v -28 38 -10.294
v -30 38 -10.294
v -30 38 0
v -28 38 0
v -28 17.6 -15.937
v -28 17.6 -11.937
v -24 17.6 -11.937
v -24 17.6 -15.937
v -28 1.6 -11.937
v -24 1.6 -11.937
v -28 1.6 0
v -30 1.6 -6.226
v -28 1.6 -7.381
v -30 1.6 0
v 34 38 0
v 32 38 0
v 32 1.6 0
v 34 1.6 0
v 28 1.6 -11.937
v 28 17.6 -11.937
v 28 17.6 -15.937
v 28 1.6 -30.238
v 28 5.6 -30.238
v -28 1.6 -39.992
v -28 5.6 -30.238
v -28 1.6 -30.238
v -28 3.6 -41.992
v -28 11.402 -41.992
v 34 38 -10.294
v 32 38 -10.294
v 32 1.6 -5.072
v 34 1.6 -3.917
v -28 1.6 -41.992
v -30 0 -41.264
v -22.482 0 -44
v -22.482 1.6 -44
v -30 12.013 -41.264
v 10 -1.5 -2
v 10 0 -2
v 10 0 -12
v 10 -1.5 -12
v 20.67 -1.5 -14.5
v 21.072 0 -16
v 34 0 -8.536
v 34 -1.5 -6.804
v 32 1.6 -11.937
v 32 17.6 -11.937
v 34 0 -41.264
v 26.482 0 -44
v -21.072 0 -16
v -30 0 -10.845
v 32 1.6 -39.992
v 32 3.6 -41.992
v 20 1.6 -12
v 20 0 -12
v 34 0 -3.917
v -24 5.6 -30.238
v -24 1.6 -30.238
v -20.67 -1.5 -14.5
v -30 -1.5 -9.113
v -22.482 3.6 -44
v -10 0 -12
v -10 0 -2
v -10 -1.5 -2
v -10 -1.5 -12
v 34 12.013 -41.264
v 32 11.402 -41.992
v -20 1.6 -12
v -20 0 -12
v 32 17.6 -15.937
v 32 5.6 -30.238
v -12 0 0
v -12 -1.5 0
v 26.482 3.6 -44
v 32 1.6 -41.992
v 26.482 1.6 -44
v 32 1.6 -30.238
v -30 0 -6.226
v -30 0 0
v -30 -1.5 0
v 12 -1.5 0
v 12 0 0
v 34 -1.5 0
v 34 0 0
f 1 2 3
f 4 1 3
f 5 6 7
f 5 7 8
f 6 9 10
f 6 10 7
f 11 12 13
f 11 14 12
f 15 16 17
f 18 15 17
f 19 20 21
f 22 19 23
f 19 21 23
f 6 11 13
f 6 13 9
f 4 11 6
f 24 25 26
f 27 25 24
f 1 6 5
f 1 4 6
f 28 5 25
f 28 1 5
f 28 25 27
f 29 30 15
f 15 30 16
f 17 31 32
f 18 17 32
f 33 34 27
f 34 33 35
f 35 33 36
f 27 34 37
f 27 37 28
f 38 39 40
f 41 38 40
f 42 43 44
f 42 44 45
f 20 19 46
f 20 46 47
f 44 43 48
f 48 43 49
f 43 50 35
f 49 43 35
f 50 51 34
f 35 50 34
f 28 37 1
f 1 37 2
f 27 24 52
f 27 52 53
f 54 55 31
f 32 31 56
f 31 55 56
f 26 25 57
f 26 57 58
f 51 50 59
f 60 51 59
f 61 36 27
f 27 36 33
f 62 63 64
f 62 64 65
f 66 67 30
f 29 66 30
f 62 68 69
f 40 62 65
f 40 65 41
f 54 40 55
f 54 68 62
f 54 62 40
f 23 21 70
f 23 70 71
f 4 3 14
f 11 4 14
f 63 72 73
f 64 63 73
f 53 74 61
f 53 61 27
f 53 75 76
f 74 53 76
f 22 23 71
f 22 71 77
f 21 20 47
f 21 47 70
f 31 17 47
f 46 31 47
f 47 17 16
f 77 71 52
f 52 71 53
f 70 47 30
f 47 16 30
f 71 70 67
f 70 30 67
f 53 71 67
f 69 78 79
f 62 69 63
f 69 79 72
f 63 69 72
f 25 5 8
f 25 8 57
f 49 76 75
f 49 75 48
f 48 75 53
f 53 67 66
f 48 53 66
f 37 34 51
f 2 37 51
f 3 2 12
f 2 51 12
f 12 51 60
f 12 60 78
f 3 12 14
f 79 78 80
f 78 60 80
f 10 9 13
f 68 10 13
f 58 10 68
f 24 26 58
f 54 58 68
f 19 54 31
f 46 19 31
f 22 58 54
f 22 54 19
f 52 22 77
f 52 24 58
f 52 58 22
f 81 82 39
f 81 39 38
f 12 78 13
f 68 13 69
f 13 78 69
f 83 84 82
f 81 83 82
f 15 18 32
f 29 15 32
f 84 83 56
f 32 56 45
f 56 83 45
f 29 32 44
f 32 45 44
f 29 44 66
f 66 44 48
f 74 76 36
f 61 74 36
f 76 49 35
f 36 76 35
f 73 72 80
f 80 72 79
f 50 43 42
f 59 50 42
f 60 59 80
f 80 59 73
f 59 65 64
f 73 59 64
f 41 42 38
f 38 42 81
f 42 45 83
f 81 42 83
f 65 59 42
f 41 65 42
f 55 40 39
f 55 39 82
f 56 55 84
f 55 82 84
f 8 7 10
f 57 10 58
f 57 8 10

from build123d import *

# Parameters (mm, degrees)
BOSS_EXTRUDE1_DEPTH      = 34
BOSS_EXTRUDE1_DEPTH_BACK = 30
SKETCH2_W                = 60
SKETCH2_H                = 44
CUT_EXTRUDE1_DEPTH       = 36.4
CUT_EXTRUDE2_DEPTH       = 1.6
BOSS_EXTRUDE2_DEPTH      = 1.5
CHAMFER1_SIZE            = 2
CUT_EXTRUDE3_REACH       = 70.207
SKETCH8_W                = 20
SKETCH8_H                = 12
CUT_EXTRUDE4_DEPTH       = 1.5
BOSS_EXTRUDE3_REACH      = 86.994
CUT_EXTRUDE7_REACH       = 61.23
SKETCH12_W               = 52
SKETCH12_H               = 18.301043111
CHAMFER2_SIZE            = 2
BOSS_EXTRUDE4_DEPTH      = 60
BOSS_EXTRUDE5_DEPTH      = 2


with BuildPart() as part:
    # Sketch1 → Boss-Extrude1 (new, two sides: drawn at the far end of the back side and taken through both)
    with BuildSketch(Plane(origin=(0, 0, 0), x_dir=(0, 0, -1), z_dir=(1, 0, 0)).offset(-BOSS_EXTRUDE1_DEPTH_BACK)):
        Polygon((0, 38), (0, 0), (44, 0), (44, 9.717345174), (10.294044503, 38), align=None)
    extrude(amount=BOSS_EXTRUDE1_DEPTH + BOSS_EXTRUDE1_DEPTH_BACK)

    # Sketch2 → Cut-Extrude1 (cut)
    with BuildSketch(Plane(origin=(0, 38, 0), x_dir=(1, 0, 0), z_dir=(0, 1, 0))):
        with Locations((2, 22)):
            Rectangle(SKETCH2_W, SKETCH2_H)
    extrude(amount=-CUT_EXTRUDE1_DEPTH, mode=Mode.SUBTRACT)

    # Sketch5 → Cut-Extrude2 (cut)
    with BuildSketch(Plane.XZ):
        Polygon((-20, -12), (20, -12), (34, -3.917096231), (34, 0), (-30, 0), (-30, -6.226497308), align=None)
    extrude(amount=-CUT_EXTRUDE2_DEPTH, mode=Mode.SUBTRACT)

    # Sketch6 → Boss-Extrude2 (add)
    with BuildSketch(Plane.XZ):
        Polygon((-30, 0), (-30, -8.535898385), (-20.535898385, -14), (20.535898385, -14), (34, -6.226497308), (34, 0), align=None)
    extrude(amount=BOSS_EXTRUDE2_DEPTH)

    # Chamfer1
    # the kernel refuses this chamfer: 2 mm, written as the material it adds along each edge
    with BuildSketch(Plane(origin=(16.081612789, 0, -16.571682988), x_dir=(0.4998109584556485, 0.027495876610586344, -0.8656979742248803), z_dir=(0.8660254037844386, 0, 0.5000000000000001))) as chamfer1_piece_1_section:
        Polygon((CHAMFER1_SIZE * 0.999621916911, -CHAMFER1_SIZE * 0.0274958766106), (-CHAMFER1_SIZE * 0.0274958766106, -CHAMFER1_SIZE * 0.999621916911), (0, 0), align=None)
    chamfer1_piece_1 = extrude(amount=25.833737336, mode=Mode.PRIVATE)
    chamfer1_piece_1 = split(chamfer1_piece_1, bisect_by=Plane(origin=(34, -0.590941393, -10.495986371), z_dir=(-1, 0, 0)), keep=Keep.TOP, mode=Mode.PRIVATE)
    chamfer1_piece_1 = split(chamfer1_piece_1, bisect_by=Plane(origin=(27.930870364, -0.590941393, -14), z_dir=(0, 0, 1)), keep=Keep.TOP, mode=Mode.PRIVATE)
    chamfer1_piece_1 = split(chamfer1_piece_1, bisect_by=Plane(origin=(27.930870364, -1.5, -10.495986371), z_dir=(0, 1, 0)), keep=Keep.TOP, mode=Mode.PRIVATE)
    add(chamfer1_piece_1)
    with BuildSketch(Plane(origin=(-34.454285596, 0, -5.964215397), x_dir=(-0.4998109584556484, 0.027495876610586348, -0.8656979742248804), z_dir=(0.8660254037844387, 0, -0.5))) as chamfer1_piece_2_section:
        Polygon((CHAMFER1_SIZE * 0.999621916911, -CHAMFER1_SIZE * 0.0274958766106), (-CHAMFER1_SIZE * 0.0274958766106, -CHAMFER1_SIZE * 0.999621916911), (0, 0), align=None)
    chamfer1_piece_2 = extrude(amount=21.214935182, mode=Mode.PRIVATE)
    chamfer1_piece_2 = split(chamfer1_piece_2, bisect_by=Plane(origin=(-30, -0.598869914, -11.638934736), z_dir=(1, 0, 0)), keep=Keep.TOP, mode=Mode.PRIVATE)
    chamfer1_piece_2 = split(chamfer1_piece_2, bisect_by=Plane(origin=(-25.910515002, -1.5, -11.638934736), z_dir=(0, 1, 0)), keep=Keep.TOP, mode=Mode.PRIVATE)
    chamfer1_piece_2 = split(chamfer1_piece_2, bisect_by=Plane(origin=(-25.910515002, -0.598869914, -14), z_dir=(0, 0, 1)), keep=Keep.TOP, mode=Mode.PRIVATE)
    add(chamfer1_piece_2)
    with BuildSketch(Plane(origin=(-25.679264361, 0, -14), x_dir=(0, 0.027495876610586424, -0.9996219169112968), z_dir=(1, 0, 0))) as chamfer1_piece_3_section:
        Polygon((CHAMFER1_SIZE * 0.999621916911, -CHAMFER1_SIZE * 0.0274958766106), (-CHAMFER1_SIZE * 0.0274958766106, -CHAMFER1_SIZE * 0.999621916911), (0, 0), align=None)
    chamfer1_piece_3 = extrude(amount=51.358528722, mode=Mode.PRIVATE)
    chamfer1_piece_3 = split(chamfer1_piece_3, bisect_by=Plane(origin=(4.838764491, -0.58360414, -23.062744479), z_dir=(-0.5000000000000001, 0, 0.8660254037844386)), keep=Keep.TOP, mode=Mode.PRIVATE)
    chamfer1_piece_3 = split(chamfer1_piece_3, bisect_by=Plane(origin=(0, -1.5, -14.681758534), z_dir=(0, 1, 0)), keep=Keep.TOP, mode=Mode.PRIVATE)
    chamfer1_piece_3 = split(chamfer1_piece_3, bisect_by=Plane(origin=(-4.838764491, -0.58360414, -23.062744479), z_dir=(0.5, 0, 0.8660254037844387)), keep=Keep.TOP, mode=Mode.PRIVATE)
    add(chamfer1_piece_3)
    with BuildSketch(Plane(origin=(16.081612789, 0, -16.571682988), x_dir=(0.4998109584556485, 0.027495876610586344, -0.8656979742248803), z_dir=(0.8660254037844386, 0, 0.5000000000000001))) as chamfer1_piece_4a_section:
        Polygon((CHAMFER1_SIZE * 0.999621916911, -CHAMFER1_SIZE * 0.0274958766106), (-CHAMFER1_SIZE * 0.0274958766106, -CHAMFER1_SIZE * 0.999621916911), (0, 0), align=None)
    chamfer1_piece_4a = extrude(amount=25.833737336, mode=Mode.PRIVATE)
    chamfer1_piece_4a = split(chamfer1_piece_4a, bisect_by=Plane(origin=(19.272748758, -0.548768343, -14), z_dir=(0, 0, -1)), keep=Keep.TOP, mode=Mode.PRIVATE)
    chamfer1_piece_4a = split(chamfer1_piece_4a, bisect_by=Plane(origin=(19.272748758, -1.5, -15.619778524), z_dir=(0, 1, 0)), keep=Keep.TOP, mode=Mode.PRIVATE)
    with BuildSketch(Plane(origin=(-25.679264361, 0, -14), x_dir=(0, 0.027495876610586424, -0.9996219169112968), z_dir=(1, 0, 0))) as chamfer1_piece_4b_section:
        Polygon((CHAMFER1_SIZE * 0.999621916911, -CHAMFER1_SIZE * 0.0274958766106), (-CHAMFER1_SIZE * 0.0274958766106, -CHAMFER1_SIZE * 0.999621916911), (0, 0), align=None)
    chamfer1_piece_4b = extrude(amount=51.358528722, mode=Mode.PRIVATE)
    chamfer1_piece_4b = split(chamfer1_piece_4b, bisect_by=Plane(origin=(21.62981805, -0.548768343, -13.368425187), z_dir=(0.5000000000000001, 0, -0.8660254037844386)), keep=Keep.TOP, mode=Mode.PRIVATE)
    chamfer1_piece_4b = split(chamfer1_piece_4b, bisect_by=Plane(origin=(22.439707312, -1.5, -14.771194537), z_dir=(0, 1, 0)), keep=Keep.TOP, mode=Mode.PRIVATE)
    chamfer1_piece_4 = chamfer1_piece_4a & chamfer1_piece_4b
    add(chamfer1_piece_4)
    with BuildSketch(Plane(origin=(-25.679264361, 0, -14), x_dir=(0, 0.027495876610586424, -0.9996219169112968), z_dir=(1, 0, 0))) as chamfer1_piece_5a_section:
        Polygon((CHAMFER1_SIZE * 0.999621916911, -CHAMFER1_SIZE * 0.0274958766106), (-CHAMFER1_SIZE * 0.0274958766106, -CHAMFER1_SIZE * 0.999621916911), (0, 0), align=None)
    chamfer1_piece_5a = extrude(amount=51.358528722, mode=Mode.PRIVATE)
    chamfer1_piece_5a = split(chamfer1_piece_5a, bisect_by=Plane(origin=(-22.439707312, -1.5, -14.771194537), z_dir=(0, 1, 0)), keep=Keep.TOP, mode=Mode.PRIVATE)
    chamfer1_piece_5a = split(chamfer1_piece_5a, bisect_by=Plane(origin=(-21.62981805, -0.548768343, -13.368425187), z_dir=(-0.5, 0, -0.8660254037844387)), keep=Keep.TOP, mode=Mode.PRIVATE)
    with BuildSketch(Plane(origin=(-34.454285596, 0, -5.964215397), x_dir=(-0.4998109584556484, 0.027495876610586348, -0.8656979742248804), z_dir=(0.8660254037844387, 0, -0.5))) as chamfer1_piece_5b_section:
        Polygon((CHAMFER1_SIZE * 0.999621916911, -CHAMFER1_SIZE * 0.0274958766106), (-CHAMFER1_SIZE * 0.0274958766106, -CHAMFER1_SIZE * 0.999621916911), (0, 0), align=None)
    chamfer1_piece_5b = extrude(amount=21.214935182, mode=Mode.PRIVATE)
    chamfer1_piece_5b = split(chamfer1_piece_5b, bisect_by=Plane(origin=(-19.272748758, -1.5, -15.619778524), z_dir=(0, 1, 0)), keep=Keep.TOP, mode=Mode.PRIVATE)
    chamfer1_piece_5b = split(chamfer1_piece_5b, bisect_by=Plane(origin=(-19.272748758, -0.548768343, -14), z_dir=(0, 0, -1)), keep=Keep.TOP, mode=Mode.PRIVATE)
    chamfer1_piece_5 = chamfer1_piece_5a & chamfer1_piece_5b
    add(chamfer1_piece_5)

    # Cut-Extrude3: up to this face of the body (flat: up to its plane)
    cut_extrude3_end = Plane(part.part.faces().sort_by_distance((2.35859889, 0, -29.378927014))[0])
    # Sketch7 → Cut-Extrude3 (cut, up to the picked face)
    with BuildSketch(Plane(origin=(0, 38, 0), x_dir=(1, 0, 0), z_dir=(0, 1, 0)), mode=Mode.PRIVATE) as cut_extrude3_sk1:
        Polygon((-30, 41.263838853), (-22.482459034, 44), (-30, 44), align=None)
    cut_extrude3_tool1 = split(extrude(cut_extrude3_sk1.sketch, amount=-CUT_EXTRUDE3_REACH, mode=Mode.PRIVATE), bisect_by=cut_extrude3_end, keep=Keep.BOTH, mode=Mode.PRIVATE)
    # Sketch7 → Cut-Extrude3 (cut, up to the picked face)
    with BuildSketch(Plane(origin=(0, 38, 0), x_dir=(1, 0, 0), z_dir=(0, 1, 0)), mode=Mode.PRIVATE) as cut_extrude3_sk2:
        Polygon((26.482459034, 44), (34, 41.263838853), (34, 44), align=None)
    cut_extrude3_tool2 = split(extrude(cut_extrude3_sk2.sketch, amount=-CUT_EXTRUDE3_REACH, mode=Mode.PRIVATE), bisect_by=cut_extrude3_end, keep=Keep.BOTH, mode=Mode.PRIVATE)
    add(cut_extrude3_tool1.solids().sort_by(Axis((-27.494153, 38, -43.087946), (0, -1, 0)))[0], mode=Mode.SUBTRACT)
    add(cut_extrude3_tool2.solids().sort_by(Axis((31.494153, 38, -43.087946), (0, -1, 0)))[0], mode=Mode.SUBTRACT)

    # Sketch8 → Cut-Extrude4 (cut)
    with BuildSketch(Plane(origin=(0, 0, 0), x_dir=(1, 0, 0), z_dir=(0, 1, 0))):
        with Locations((0, 6)):
            Rectangle(SKETCH8_W, SKETCH8_H)
    extrude(amount=-CUT_EXTRUDE4_DEPTH, mode=Mode.SUBTRACT)

    # Boss-Extrude3: up to this face of the body (flat: up to its plane)
    boss_extrude3_end = Plane(part.part.faces().sort_by_distance((32, 16.245464339, -17.024050876))[0])
    # Sketch11 → Boss-Extrude3 (add, up to the picked face)
    with BuildSketch(Plane(origin=(-28, 0, 0), x_dir=(0, 0, -1), z_dir=(1, 0, 0)), mode=Mode.PRIVATE) as boss_extrude3_sk1:
        Polygon((15.937131869, 17.6), (30.23817498, 5.6), (30.23817498, 1.6), (11.937131869, 1.6), (11.937131869, 17.6), align=None)
    boss_extrude3_tool1 = split(extrude(boss_extrude3_sk1.sketch, amount=BOSS_EXTRUDE3_REACH, mode=Mode.PRIVATE), bisect_by=boss_extrude3_end, keep=Keep.BOTH, mode=Mode.PRIVATE)
    add(boss_extrude3_tool1.solids().sort_by(Axis((-28, 7.941992, -19.27068), (1, 0, 0)))[0])

    # Cut-Extrude7: up to this face of the body (flat: up to its plane)
    cut_extrude7_end = Plane(part.part.faces().sort_by_distance((2, 1.6, -37.034599694))[0])
    # Sketch12 → Cut-Extrude7 (cut, up to the picked face)
    with BuildSketch(Plane(origin=(0, 17.6, 0), x_dir=(1, 0, 0), z_dir=(0, 1, 0)), mode=Mode.PRIVATE) as cut_extrude7_sk1:
        with Locations((2, 21.087653425)):
            Rectangle(SKETCH12_W, SKETCH12_H)
    cut_extrude7_tool1 = split(extrude(cut_extrude7_sk1.sketch, amount=-CUT_EXTRUDE7_REACH, mode=Mode.PRIVATE), bisect_by=cut_extrude7_end, keep=Keep.BOTH, mode=Mode.PRIVATE)
    add(cut_extrude7_tool1.solids().sort_by(Axis((2, 17.6, -21.087653), (0, -1, 0)))[0], mode=Mode.SUBTRACT)

    # Chamfer2
    chamfer2_edges = [part.edges().sort_by_distance(p)[0] for p in [
        (10, -0.75, 0),
        (-10, -0.75, 0),
    ]]
    chamfer(chamfer2_edges, length=CHAMFER2_SIZE)

    # Sketch14 → Boss-Extrude4 (add)
    with BuildSketch(Plane(origin=(-28, 0, 0), x_dir=(0, 0, -1), z_dir=(1, 0, 0))):
        Polygon((41.991779322, 3.6), (41.991779322, 1.6), (39.991779322, 1.6), align=None)
    extrude(amount=BOSS_EXTRUDE4_DEPTH)

    # Sketch15 → Boss-Extrude5 (add)
    with BuildSketch(Plane(origin=(0, 1.6, 0), x_dir=(1, 0, 0), z_dir=(0, 1, 0))):
        Polygon((-28, 41.991779322), (32, 41.991779322), (26.482459034, 44), (-22.482459034, 44), align=None)
    extrude(amount=BOSS_EXTRUDE5_DEPTH)


solid = part.part
